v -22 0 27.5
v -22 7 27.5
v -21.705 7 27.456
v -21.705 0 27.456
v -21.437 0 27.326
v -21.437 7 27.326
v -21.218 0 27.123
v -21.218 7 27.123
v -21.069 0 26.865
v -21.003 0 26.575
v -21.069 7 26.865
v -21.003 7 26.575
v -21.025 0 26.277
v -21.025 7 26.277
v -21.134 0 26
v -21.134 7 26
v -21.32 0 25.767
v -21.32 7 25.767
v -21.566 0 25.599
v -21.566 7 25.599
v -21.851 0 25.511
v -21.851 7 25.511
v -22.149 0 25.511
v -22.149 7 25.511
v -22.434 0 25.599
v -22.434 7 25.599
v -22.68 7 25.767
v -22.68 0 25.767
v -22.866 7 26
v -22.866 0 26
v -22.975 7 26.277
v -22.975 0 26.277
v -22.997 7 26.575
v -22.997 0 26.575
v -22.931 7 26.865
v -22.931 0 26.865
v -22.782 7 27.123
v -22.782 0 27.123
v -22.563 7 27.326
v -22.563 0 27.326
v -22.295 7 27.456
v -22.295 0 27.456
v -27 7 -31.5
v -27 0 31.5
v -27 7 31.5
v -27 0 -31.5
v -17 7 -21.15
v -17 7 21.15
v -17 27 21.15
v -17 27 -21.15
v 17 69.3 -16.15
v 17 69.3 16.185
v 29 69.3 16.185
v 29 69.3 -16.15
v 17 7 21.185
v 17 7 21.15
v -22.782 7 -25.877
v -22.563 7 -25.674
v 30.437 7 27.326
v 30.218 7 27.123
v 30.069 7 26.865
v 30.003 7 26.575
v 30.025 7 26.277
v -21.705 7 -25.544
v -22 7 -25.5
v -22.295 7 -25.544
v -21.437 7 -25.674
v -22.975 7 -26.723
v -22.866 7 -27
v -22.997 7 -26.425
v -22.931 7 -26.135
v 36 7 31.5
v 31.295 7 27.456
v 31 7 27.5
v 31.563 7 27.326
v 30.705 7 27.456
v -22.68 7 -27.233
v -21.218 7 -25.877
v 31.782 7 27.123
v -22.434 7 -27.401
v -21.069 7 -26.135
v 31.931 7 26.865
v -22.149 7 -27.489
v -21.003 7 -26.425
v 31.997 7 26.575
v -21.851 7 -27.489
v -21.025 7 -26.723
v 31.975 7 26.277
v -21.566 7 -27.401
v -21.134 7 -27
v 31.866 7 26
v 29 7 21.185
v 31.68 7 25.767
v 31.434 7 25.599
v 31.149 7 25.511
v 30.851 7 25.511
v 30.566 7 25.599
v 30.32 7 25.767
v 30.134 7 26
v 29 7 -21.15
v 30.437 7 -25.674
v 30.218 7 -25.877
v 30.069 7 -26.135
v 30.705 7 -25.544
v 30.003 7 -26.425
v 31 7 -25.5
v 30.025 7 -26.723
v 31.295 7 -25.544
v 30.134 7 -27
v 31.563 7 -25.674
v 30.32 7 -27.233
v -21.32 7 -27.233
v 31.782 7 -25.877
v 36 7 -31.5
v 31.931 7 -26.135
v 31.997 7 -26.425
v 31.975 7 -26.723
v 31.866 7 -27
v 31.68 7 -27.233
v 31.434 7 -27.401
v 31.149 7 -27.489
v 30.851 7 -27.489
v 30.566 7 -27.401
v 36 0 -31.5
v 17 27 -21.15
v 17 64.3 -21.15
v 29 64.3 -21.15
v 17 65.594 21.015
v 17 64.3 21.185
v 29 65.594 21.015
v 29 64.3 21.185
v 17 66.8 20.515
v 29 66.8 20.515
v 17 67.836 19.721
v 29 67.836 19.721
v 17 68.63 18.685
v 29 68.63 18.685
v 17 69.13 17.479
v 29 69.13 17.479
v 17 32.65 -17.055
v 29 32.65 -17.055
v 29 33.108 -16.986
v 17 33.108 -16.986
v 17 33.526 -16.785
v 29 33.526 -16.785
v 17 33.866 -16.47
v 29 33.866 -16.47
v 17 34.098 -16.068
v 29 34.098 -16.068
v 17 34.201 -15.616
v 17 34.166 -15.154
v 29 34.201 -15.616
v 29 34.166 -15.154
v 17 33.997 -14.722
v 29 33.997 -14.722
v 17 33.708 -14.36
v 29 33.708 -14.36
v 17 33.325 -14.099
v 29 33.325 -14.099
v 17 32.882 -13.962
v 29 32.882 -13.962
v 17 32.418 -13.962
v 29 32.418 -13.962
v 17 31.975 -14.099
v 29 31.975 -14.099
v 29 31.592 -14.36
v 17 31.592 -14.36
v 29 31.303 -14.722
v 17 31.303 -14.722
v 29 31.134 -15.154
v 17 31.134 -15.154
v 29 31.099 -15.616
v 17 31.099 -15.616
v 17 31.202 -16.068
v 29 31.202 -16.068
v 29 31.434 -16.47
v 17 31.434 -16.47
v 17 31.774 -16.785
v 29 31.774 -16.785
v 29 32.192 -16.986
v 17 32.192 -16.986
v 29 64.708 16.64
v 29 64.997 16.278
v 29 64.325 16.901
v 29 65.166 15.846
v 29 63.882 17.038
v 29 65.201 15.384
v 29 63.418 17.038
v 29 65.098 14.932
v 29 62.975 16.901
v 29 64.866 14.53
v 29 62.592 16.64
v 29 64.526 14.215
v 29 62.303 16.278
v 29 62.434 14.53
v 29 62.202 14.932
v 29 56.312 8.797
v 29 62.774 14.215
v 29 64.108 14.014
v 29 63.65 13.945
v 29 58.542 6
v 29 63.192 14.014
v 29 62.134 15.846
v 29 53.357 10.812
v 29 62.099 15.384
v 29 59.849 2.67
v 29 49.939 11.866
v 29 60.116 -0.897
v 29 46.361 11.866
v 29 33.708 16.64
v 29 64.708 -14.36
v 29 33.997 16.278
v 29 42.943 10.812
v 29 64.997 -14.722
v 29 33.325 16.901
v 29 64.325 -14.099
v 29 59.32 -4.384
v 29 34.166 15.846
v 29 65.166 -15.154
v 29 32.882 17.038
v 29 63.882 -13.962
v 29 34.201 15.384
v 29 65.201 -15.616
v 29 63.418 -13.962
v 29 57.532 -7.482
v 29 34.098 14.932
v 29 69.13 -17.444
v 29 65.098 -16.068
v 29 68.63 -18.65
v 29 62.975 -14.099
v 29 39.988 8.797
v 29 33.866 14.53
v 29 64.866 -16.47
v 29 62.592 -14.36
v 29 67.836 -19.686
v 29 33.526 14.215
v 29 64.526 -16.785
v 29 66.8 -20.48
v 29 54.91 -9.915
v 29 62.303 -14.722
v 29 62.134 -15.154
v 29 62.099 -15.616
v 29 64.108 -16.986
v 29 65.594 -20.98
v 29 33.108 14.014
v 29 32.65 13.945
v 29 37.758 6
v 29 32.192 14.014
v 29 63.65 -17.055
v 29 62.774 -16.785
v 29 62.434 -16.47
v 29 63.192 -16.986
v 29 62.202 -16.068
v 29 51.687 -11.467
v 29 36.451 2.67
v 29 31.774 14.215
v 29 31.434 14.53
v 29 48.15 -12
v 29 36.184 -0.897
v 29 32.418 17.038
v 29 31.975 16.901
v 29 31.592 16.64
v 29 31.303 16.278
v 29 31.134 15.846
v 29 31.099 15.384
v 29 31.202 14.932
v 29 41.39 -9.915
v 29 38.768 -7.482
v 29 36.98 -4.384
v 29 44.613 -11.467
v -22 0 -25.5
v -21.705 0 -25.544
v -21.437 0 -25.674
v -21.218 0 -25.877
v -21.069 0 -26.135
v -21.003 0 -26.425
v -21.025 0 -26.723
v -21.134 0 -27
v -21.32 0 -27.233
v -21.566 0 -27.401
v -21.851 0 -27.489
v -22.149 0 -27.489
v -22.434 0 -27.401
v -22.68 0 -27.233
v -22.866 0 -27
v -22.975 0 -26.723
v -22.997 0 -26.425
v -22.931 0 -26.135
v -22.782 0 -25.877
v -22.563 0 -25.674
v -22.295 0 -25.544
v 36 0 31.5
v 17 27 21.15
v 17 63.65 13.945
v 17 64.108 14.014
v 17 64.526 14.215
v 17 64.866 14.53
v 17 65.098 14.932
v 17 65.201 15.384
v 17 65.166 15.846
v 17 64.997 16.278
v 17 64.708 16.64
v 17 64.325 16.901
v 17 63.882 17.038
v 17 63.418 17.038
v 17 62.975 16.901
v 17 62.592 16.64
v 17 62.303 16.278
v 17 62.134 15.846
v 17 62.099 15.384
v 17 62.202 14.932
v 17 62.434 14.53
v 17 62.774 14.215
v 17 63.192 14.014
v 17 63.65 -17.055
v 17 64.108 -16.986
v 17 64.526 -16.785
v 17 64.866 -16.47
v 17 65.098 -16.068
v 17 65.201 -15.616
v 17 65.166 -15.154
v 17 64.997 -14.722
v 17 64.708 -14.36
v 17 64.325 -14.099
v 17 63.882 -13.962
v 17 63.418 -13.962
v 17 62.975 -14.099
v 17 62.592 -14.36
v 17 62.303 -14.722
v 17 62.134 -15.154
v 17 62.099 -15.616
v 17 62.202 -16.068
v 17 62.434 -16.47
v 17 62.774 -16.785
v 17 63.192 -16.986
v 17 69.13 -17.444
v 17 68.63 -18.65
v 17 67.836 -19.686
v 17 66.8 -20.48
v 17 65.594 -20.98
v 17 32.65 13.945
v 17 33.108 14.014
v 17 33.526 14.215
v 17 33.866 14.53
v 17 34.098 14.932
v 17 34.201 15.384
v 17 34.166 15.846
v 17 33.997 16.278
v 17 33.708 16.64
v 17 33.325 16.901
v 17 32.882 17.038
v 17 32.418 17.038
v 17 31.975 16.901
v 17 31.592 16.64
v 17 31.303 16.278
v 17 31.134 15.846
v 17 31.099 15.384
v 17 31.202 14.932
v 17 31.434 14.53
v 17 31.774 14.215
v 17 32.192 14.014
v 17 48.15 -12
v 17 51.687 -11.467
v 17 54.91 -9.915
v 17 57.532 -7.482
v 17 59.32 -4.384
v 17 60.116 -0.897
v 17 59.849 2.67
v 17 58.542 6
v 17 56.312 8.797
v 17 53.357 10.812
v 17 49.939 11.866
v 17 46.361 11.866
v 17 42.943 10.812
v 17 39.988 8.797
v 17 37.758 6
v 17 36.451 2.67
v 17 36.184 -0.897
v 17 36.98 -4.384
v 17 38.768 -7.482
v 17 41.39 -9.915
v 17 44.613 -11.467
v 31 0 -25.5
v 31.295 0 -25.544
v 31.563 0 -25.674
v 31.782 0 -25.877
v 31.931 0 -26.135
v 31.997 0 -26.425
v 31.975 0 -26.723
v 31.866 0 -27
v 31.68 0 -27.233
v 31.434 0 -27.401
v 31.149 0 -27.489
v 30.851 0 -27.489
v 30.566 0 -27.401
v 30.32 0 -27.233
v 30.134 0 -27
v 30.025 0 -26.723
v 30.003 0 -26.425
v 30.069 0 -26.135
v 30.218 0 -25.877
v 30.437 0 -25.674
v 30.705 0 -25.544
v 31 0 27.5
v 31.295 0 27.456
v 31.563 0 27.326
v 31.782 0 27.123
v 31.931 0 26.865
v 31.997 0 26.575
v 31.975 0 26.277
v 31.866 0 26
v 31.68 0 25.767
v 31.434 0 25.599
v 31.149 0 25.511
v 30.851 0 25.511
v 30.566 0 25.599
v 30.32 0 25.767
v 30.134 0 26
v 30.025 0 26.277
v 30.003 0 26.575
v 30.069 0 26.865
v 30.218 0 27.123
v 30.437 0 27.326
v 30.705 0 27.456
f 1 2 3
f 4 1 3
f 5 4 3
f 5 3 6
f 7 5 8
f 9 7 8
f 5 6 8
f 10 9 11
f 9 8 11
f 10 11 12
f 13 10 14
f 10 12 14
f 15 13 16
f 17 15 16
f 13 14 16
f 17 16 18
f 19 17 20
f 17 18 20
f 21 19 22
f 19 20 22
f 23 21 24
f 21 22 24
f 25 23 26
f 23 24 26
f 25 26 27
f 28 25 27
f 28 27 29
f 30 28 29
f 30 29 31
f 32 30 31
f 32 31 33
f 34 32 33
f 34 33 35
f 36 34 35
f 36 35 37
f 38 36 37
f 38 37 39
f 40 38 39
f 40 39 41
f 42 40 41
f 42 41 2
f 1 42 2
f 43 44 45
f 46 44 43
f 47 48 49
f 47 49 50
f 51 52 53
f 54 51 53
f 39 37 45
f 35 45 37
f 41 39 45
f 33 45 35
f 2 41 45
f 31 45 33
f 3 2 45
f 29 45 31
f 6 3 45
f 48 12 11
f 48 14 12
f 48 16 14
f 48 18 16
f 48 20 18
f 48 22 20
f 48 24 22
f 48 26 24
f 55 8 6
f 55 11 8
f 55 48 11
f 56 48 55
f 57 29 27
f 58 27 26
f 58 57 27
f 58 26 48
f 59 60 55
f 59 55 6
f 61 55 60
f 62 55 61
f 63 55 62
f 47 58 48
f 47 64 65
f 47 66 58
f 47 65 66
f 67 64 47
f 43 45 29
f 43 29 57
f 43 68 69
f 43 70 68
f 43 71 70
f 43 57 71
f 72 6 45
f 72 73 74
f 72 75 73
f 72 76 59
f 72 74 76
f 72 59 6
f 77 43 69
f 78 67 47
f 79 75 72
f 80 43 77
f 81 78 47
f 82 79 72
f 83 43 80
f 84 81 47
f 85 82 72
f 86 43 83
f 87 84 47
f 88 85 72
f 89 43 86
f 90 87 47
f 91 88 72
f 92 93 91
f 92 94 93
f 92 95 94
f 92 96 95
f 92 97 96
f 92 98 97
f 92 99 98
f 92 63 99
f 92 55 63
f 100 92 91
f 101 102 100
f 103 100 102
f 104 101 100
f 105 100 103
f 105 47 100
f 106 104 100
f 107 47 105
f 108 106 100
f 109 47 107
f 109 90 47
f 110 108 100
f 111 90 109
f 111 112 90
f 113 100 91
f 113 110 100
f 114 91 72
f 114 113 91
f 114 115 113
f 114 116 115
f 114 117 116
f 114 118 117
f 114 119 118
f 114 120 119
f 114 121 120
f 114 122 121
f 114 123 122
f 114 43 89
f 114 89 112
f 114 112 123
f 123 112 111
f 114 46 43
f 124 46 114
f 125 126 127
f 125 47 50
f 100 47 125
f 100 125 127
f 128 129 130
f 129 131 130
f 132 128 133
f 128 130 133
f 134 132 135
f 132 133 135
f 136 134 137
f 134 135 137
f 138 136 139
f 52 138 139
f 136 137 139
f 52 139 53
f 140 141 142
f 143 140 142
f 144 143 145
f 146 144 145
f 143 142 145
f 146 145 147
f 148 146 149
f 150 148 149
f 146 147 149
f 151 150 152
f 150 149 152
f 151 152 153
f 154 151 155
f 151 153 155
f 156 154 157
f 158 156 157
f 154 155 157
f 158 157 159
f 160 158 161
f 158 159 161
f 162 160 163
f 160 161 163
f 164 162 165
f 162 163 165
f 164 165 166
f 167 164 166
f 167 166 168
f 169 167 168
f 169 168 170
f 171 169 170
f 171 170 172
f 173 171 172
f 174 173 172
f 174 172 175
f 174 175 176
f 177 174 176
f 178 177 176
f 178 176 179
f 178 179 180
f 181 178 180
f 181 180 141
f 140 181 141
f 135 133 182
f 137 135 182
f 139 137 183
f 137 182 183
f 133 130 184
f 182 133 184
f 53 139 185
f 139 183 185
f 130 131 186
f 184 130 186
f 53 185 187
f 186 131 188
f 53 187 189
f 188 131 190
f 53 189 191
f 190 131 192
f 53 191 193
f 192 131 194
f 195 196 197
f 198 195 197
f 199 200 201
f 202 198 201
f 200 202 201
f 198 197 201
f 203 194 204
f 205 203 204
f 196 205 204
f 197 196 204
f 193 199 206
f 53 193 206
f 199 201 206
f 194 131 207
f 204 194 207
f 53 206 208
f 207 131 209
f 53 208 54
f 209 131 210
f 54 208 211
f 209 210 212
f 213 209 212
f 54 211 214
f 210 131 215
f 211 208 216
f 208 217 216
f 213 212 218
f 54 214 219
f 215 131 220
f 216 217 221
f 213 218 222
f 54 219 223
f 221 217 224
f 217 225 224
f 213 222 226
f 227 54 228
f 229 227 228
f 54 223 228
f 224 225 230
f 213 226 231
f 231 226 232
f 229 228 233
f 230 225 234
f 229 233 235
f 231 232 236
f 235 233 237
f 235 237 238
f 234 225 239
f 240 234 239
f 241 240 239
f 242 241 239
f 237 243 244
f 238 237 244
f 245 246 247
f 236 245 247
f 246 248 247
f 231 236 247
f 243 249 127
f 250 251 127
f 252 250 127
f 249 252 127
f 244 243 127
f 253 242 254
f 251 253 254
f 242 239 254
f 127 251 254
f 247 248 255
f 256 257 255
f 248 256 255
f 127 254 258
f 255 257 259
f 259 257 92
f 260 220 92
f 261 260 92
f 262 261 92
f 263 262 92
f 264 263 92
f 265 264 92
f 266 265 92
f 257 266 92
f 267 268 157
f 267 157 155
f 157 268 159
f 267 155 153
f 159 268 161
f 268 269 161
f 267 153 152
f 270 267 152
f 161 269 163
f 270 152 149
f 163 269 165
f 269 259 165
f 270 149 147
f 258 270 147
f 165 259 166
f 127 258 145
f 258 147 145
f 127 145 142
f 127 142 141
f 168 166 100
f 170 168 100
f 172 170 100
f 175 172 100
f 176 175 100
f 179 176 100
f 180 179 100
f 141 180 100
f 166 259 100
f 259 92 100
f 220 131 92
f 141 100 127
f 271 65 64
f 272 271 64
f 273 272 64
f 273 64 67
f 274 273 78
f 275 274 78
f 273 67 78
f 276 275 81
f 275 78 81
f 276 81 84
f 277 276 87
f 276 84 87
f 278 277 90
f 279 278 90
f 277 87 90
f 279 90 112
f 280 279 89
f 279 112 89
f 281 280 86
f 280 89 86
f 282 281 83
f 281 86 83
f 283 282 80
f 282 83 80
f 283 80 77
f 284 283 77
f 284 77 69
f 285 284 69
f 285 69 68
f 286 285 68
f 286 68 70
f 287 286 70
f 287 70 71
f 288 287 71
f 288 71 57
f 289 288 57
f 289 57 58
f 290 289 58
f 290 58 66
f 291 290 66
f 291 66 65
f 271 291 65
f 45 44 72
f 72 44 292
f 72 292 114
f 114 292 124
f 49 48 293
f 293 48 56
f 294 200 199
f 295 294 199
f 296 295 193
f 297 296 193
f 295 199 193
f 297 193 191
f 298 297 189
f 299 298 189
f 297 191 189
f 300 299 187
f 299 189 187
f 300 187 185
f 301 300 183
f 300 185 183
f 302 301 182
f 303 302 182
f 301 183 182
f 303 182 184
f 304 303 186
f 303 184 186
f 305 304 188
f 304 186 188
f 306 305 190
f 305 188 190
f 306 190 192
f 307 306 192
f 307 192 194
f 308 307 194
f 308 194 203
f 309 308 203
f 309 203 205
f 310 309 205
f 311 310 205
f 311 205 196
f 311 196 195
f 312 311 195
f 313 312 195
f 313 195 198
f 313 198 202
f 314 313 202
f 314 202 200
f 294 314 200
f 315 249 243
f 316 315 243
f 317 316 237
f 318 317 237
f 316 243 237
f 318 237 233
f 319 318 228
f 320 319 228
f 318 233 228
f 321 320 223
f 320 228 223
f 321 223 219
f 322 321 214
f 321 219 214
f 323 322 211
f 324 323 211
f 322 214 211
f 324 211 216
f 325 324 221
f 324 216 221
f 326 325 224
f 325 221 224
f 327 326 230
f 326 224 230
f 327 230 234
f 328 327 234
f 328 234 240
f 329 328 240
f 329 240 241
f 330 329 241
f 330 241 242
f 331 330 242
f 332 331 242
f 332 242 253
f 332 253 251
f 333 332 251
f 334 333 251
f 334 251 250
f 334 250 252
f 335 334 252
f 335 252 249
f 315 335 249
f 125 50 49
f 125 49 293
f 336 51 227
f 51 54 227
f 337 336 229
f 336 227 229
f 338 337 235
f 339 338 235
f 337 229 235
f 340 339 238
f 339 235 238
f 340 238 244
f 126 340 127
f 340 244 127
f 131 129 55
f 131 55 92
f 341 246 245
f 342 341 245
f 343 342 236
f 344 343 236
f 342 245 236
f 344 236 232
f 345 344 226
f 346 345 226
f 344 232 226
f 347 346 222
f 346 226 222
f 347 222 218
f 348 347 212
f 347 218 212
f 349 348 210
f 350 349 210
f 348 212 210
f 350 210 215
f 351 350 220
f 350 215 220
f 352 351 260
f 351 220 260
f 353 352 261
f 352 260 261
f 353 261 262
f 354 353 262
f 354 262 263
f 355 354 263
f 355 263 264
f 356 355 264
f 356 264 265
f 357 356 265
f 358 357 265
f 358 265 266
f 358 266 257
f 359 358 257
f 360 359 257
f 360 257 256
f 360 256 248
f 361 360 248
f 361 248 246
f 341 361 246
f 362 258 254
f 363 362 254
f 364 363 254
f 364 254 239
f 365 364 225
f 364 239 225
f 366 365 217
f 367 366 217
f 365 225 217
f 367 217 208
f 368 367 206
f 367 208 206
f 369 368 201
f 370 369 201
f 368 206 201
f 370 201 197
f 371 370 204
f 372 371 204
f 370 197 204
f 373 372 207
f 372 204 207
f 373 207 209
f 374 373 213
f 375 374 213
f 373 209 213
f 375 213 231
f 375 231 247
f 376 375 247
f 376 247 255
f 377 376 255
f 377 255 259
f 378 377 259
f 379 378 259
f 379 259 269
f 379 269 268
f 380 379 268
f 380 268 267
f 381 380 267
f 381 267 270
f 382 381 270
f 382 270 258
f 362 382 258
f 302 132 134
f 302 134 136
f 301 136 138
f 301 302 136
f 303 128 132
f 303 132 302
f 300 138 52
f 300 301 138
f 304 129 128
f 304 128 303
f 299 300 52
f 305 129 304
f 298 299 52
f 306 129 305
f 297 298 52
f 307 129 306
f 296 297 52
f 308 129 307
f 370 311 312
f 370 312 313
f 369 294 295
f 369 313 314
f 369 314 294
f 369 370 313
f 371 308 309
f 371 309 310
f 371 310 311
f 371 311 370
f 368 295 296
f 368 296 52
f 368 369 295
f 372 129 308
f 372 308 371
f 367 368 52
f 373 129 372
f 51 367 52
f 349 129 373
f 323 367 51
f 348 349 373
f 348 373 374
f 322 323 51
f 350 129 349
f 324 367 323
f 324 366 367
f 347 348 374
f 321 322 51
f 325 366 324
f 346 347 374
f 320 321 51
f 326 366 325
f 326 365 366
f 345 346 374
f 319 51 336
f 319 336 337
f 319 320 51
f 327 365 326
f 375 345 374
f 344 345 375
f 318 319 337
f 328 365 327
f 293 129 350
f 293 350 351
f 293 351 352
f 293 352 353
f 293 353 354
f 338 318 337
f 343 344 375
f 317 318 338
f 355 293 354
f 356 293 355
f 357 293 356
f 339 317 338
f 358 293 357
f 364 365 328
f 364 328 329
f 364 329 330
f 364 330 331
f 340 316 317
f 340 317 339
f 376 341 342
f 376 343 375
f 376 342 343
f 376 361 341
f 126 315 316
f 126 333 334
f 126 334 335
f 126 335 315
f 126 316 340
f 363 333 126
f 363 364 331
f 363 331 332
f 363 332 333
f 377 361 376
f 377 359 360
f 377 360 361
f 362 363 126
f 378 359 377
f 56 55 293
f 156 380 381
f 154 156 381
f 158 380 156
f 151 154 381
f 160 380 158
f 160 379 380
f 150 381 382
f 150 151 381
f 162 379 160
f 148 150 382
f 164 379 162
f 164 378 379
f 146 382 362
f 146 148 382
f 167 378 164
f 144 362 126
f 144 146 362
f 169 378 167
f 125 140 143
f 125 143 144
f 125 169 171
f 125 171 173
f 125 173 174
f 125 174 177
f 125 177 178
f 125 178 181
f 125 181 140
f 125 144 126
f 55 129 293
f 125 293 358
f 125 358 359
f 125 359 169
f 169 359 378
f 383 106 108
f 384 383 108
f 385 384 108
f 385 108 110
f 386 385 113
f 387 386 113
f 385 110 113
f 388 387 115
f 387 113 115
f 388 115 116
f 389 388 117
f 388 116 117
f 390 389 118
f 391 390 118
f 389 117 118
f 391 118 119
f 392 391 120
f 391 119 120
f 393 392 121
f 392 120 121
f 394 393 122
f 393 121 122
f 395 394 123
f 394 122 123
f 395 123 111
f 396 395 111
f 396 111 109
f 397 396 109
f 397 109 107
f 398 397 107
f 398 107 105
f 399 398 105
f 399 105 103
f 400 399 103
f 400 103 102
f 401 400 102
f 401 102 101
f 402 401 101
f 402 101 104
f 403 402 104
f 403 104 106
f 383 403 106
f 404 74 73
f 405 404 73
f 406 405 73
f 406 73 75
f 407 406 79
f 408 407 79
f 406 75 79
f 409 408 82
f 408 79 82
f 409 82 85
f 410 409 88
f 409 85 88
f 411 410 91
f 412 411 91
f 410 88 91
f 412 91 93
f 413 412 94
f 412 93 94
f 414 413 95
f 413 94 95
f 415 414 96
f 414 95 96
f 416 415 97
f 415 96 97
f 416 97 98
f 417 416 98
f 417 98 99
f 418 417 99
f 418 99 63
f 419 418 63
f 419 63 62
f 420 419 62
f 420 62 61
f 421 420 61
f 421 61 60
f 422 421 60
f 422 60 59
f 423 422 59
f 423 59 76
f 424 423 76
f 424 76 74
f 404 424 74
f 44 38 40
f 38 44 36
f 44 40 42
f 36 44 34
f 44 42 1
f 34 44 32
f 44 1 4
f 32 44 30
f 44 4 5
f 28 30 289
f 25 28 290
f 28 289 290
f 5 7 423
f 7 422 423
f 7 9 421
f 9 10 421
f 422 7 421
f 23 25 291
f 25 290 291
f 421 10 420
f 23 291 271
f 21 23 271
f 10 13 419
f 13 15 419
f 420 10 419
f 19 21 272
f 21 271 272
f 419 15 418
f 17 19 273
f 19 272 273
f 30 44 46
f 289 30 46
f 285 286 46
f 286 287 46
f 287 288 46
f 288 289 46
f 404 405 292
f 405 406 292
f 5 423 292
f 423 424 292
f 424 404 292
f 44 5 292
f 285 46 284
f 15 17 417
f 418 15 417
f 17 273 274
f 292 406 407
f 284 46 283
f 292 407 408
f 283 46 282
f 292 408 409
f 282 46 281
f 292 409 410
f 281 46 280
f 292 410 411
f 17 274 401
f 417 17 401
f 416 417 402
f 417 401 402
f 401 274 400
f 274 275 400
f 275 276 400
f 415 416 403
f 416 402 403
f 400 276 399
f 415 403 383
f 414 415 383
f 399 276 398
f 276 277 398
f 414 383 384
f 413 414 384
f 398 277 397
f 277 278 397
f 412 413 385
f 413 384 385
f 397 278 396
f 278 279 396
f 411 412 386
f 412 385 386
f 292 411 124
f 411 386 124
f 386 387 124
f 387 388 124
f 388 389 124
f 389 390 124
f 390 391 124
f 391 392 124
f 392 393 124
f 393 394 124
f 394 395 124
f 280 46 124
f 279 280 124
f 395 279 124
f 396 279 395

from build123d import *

# Parameters (mm, degrees)
SKETCH1_W              = 63
SKETCH1_H              = 63
BASE_PLATE_DEPTH       = 7
SKETCH4_W              = 34
SKETCH4_H              = 42.3
MAIN_SUPPORT_DEPTH     = 20
SKETCH5_W              = 12
SKETCH5_H              = 42.335
SCREW_SUPPORT_DEPTH    = 62.3
SKETCH6_R              = 12
SKETCH6_R_2            = 1.555
SCREW_DEPTH            = 50
SCREW_SUPPORT_FILLET_R = 5
BASE_SCREW_REACH       = 80.546
SKETCH7_R              = 1


with BuildPart() as part:
    # Sketch1 → Base Plate (new body)
    with BuildSketch(Plane(origin=(0, 0, 0), x_dir=(1, 0, 0), z_dir=(0, 1, 0))):
        with Locations((4.5, 0)):
            Rectangle(SKETCH1_W, SKETCH1_H)
    extrude(amount=BASE_PLATE_DEPTH)

    # Sketch4 → Main Support (add)
    with BuildSketch(Plane(origin=(0, 7, 0), x_dir=(1, 0, 0), z_dir=(0, 1, 0))):
        Rectangle(SKETCH4_W, SKETCH4_H)
    extrude(amount=MAIN_SUPPORT_DEPTH)

    # Sketch5 → Screw Support (add)
    with BuildSketch(Plane(origin=(0, 7, 0), x_dir=(1, 0, 0), z_dir=(0, 1, 0))):
        with Locations((23, -0.0175)):
            Rectangle(SKETCH5_W, SKETCH5_H)
    extrude(amount=SCREW_SUPPORT_DEPTH)

    # Sketch6 → Screw (cut)
    with BuildSketch(Plane(origin=(29, 0, 0), x_dir=(0, 0, -1), z_dir=(1, 0, 0))):
        with Locations((0, 48.15)):
            Circle(SKETCH6_R)
        with Locations((-15.5, 32.65)):
            Circle(SKETCH6_R_2)
        with Locations((15.5, 32.65)):
            Circle(SKETCH6_R_2)
        with Locations((15.5, 63.65)):
            Circle(SKETCH6_R_2)
        with Locations((-15.5, 63.65)):
            Circle(SKETCH6_R_2)
    extrude(amount=-SCREW_DEPTH, mode=Mode.SUBTRACT)

    # Screw Support Fillet
    screw_support_fillet_edges = [part.edges().sort_by_distance(p)[0] for p in [
        (23, 69.3, 21.185),
        (23, 69.3, -21.15),
    ]]
    fillet(screw_support_fillet_edges, radius=SCREW_SUPPORT_FILLET_R)

    # Sketch7 → Base Screw (cut, up to next)
    with BuildSketch(Plane(origin=(0, 7, 0), x_dir=(1, 0, 0), z_dir=(0, 1, 0)), mode=Mode.PRIVATE) as base_screw_sk1:
        with Locations(Location((-22, 26.5, 0), (0, 0, 270))):
            Circle(SKETCH7_R)
    base_screw_tool1 = extrude(base_screw_sk1.sketch, amount=-BASE_SCREW_REACH, mode=Mode.PRIVATE) & part.part
    # Sketch7 → Base Screw (cut, up to next)
    with BuildSketch(Plane(origin=(0, 7, 0), x_dir=(1, 0, 0), z_dir=(0, 1, 0)), mode=Mode.PRIVATE) as base_screw_sk2:
        with Locations(Location((31, 26.5, 0), (0, 0, 270))):
            Circle(SKETCH7_R)
    base_screw_tool2 = extrude(base_screw_sk2.sketch, amount=-BASE_SCREW_REACH, mode=Mode.PRIVATE) & part.part
    # Sketch7 → Base Screw (cut, up to next)
    with BuildSketch(Plane(origin=(0, 7, 0), x_dir=(1, 0, 0), z_dir=(0, 1, 0)), mode=Mode.PRIVATE) as base_screw_sk3:
        with Locations(Location((31, -26.5, 0), (0, 0, 270))):
            Circle(SKETCH7_R)
    base_screw_tool3 = extrude(base_screw_sk3.sketch, amount=-BASE_SCREW_REACH, mode=Mode.PRIVATE) & part.part
    # Sketch7 → Base Screw (cut, up to next)
    with BuildSketch(Plane(origin=(0, 7, 0), x_dir=(1, 0, 0), z_dir=(0, 1, 0)), mode=Mode.PRIVATE) as base_screw_sk4:
        with Locations(Location((-22, -26.5, 0), (0, 0, 270))):
            Circle(SKETCH7_R)
    base_screw_tool4 = extrude(base_screw_sk4.sketch, amount=-BASE_SCREW_REACH, mode=Mode.PRIVATE) & part.part
    add(base_screw_tool1.solids().sort_by_distance((-22, 7, -26.5))[0], mode=Mode.SUBTRACT)
    add(base_screw_tool2.solids().sort_by_distance((31, 7, -26.5))[0], mode=Mode.SUBTRACT)
    add(base_screw_tool3.solids().sort_by_distance((31, 7, 26.5))[0], mode=Mode.SUBTRACT)
    add(base_screw_tool4.solids().sort_by_distance((-22, 7, 26.5))[0], mode=Mode.SUBTRACT)


solid = part.part
